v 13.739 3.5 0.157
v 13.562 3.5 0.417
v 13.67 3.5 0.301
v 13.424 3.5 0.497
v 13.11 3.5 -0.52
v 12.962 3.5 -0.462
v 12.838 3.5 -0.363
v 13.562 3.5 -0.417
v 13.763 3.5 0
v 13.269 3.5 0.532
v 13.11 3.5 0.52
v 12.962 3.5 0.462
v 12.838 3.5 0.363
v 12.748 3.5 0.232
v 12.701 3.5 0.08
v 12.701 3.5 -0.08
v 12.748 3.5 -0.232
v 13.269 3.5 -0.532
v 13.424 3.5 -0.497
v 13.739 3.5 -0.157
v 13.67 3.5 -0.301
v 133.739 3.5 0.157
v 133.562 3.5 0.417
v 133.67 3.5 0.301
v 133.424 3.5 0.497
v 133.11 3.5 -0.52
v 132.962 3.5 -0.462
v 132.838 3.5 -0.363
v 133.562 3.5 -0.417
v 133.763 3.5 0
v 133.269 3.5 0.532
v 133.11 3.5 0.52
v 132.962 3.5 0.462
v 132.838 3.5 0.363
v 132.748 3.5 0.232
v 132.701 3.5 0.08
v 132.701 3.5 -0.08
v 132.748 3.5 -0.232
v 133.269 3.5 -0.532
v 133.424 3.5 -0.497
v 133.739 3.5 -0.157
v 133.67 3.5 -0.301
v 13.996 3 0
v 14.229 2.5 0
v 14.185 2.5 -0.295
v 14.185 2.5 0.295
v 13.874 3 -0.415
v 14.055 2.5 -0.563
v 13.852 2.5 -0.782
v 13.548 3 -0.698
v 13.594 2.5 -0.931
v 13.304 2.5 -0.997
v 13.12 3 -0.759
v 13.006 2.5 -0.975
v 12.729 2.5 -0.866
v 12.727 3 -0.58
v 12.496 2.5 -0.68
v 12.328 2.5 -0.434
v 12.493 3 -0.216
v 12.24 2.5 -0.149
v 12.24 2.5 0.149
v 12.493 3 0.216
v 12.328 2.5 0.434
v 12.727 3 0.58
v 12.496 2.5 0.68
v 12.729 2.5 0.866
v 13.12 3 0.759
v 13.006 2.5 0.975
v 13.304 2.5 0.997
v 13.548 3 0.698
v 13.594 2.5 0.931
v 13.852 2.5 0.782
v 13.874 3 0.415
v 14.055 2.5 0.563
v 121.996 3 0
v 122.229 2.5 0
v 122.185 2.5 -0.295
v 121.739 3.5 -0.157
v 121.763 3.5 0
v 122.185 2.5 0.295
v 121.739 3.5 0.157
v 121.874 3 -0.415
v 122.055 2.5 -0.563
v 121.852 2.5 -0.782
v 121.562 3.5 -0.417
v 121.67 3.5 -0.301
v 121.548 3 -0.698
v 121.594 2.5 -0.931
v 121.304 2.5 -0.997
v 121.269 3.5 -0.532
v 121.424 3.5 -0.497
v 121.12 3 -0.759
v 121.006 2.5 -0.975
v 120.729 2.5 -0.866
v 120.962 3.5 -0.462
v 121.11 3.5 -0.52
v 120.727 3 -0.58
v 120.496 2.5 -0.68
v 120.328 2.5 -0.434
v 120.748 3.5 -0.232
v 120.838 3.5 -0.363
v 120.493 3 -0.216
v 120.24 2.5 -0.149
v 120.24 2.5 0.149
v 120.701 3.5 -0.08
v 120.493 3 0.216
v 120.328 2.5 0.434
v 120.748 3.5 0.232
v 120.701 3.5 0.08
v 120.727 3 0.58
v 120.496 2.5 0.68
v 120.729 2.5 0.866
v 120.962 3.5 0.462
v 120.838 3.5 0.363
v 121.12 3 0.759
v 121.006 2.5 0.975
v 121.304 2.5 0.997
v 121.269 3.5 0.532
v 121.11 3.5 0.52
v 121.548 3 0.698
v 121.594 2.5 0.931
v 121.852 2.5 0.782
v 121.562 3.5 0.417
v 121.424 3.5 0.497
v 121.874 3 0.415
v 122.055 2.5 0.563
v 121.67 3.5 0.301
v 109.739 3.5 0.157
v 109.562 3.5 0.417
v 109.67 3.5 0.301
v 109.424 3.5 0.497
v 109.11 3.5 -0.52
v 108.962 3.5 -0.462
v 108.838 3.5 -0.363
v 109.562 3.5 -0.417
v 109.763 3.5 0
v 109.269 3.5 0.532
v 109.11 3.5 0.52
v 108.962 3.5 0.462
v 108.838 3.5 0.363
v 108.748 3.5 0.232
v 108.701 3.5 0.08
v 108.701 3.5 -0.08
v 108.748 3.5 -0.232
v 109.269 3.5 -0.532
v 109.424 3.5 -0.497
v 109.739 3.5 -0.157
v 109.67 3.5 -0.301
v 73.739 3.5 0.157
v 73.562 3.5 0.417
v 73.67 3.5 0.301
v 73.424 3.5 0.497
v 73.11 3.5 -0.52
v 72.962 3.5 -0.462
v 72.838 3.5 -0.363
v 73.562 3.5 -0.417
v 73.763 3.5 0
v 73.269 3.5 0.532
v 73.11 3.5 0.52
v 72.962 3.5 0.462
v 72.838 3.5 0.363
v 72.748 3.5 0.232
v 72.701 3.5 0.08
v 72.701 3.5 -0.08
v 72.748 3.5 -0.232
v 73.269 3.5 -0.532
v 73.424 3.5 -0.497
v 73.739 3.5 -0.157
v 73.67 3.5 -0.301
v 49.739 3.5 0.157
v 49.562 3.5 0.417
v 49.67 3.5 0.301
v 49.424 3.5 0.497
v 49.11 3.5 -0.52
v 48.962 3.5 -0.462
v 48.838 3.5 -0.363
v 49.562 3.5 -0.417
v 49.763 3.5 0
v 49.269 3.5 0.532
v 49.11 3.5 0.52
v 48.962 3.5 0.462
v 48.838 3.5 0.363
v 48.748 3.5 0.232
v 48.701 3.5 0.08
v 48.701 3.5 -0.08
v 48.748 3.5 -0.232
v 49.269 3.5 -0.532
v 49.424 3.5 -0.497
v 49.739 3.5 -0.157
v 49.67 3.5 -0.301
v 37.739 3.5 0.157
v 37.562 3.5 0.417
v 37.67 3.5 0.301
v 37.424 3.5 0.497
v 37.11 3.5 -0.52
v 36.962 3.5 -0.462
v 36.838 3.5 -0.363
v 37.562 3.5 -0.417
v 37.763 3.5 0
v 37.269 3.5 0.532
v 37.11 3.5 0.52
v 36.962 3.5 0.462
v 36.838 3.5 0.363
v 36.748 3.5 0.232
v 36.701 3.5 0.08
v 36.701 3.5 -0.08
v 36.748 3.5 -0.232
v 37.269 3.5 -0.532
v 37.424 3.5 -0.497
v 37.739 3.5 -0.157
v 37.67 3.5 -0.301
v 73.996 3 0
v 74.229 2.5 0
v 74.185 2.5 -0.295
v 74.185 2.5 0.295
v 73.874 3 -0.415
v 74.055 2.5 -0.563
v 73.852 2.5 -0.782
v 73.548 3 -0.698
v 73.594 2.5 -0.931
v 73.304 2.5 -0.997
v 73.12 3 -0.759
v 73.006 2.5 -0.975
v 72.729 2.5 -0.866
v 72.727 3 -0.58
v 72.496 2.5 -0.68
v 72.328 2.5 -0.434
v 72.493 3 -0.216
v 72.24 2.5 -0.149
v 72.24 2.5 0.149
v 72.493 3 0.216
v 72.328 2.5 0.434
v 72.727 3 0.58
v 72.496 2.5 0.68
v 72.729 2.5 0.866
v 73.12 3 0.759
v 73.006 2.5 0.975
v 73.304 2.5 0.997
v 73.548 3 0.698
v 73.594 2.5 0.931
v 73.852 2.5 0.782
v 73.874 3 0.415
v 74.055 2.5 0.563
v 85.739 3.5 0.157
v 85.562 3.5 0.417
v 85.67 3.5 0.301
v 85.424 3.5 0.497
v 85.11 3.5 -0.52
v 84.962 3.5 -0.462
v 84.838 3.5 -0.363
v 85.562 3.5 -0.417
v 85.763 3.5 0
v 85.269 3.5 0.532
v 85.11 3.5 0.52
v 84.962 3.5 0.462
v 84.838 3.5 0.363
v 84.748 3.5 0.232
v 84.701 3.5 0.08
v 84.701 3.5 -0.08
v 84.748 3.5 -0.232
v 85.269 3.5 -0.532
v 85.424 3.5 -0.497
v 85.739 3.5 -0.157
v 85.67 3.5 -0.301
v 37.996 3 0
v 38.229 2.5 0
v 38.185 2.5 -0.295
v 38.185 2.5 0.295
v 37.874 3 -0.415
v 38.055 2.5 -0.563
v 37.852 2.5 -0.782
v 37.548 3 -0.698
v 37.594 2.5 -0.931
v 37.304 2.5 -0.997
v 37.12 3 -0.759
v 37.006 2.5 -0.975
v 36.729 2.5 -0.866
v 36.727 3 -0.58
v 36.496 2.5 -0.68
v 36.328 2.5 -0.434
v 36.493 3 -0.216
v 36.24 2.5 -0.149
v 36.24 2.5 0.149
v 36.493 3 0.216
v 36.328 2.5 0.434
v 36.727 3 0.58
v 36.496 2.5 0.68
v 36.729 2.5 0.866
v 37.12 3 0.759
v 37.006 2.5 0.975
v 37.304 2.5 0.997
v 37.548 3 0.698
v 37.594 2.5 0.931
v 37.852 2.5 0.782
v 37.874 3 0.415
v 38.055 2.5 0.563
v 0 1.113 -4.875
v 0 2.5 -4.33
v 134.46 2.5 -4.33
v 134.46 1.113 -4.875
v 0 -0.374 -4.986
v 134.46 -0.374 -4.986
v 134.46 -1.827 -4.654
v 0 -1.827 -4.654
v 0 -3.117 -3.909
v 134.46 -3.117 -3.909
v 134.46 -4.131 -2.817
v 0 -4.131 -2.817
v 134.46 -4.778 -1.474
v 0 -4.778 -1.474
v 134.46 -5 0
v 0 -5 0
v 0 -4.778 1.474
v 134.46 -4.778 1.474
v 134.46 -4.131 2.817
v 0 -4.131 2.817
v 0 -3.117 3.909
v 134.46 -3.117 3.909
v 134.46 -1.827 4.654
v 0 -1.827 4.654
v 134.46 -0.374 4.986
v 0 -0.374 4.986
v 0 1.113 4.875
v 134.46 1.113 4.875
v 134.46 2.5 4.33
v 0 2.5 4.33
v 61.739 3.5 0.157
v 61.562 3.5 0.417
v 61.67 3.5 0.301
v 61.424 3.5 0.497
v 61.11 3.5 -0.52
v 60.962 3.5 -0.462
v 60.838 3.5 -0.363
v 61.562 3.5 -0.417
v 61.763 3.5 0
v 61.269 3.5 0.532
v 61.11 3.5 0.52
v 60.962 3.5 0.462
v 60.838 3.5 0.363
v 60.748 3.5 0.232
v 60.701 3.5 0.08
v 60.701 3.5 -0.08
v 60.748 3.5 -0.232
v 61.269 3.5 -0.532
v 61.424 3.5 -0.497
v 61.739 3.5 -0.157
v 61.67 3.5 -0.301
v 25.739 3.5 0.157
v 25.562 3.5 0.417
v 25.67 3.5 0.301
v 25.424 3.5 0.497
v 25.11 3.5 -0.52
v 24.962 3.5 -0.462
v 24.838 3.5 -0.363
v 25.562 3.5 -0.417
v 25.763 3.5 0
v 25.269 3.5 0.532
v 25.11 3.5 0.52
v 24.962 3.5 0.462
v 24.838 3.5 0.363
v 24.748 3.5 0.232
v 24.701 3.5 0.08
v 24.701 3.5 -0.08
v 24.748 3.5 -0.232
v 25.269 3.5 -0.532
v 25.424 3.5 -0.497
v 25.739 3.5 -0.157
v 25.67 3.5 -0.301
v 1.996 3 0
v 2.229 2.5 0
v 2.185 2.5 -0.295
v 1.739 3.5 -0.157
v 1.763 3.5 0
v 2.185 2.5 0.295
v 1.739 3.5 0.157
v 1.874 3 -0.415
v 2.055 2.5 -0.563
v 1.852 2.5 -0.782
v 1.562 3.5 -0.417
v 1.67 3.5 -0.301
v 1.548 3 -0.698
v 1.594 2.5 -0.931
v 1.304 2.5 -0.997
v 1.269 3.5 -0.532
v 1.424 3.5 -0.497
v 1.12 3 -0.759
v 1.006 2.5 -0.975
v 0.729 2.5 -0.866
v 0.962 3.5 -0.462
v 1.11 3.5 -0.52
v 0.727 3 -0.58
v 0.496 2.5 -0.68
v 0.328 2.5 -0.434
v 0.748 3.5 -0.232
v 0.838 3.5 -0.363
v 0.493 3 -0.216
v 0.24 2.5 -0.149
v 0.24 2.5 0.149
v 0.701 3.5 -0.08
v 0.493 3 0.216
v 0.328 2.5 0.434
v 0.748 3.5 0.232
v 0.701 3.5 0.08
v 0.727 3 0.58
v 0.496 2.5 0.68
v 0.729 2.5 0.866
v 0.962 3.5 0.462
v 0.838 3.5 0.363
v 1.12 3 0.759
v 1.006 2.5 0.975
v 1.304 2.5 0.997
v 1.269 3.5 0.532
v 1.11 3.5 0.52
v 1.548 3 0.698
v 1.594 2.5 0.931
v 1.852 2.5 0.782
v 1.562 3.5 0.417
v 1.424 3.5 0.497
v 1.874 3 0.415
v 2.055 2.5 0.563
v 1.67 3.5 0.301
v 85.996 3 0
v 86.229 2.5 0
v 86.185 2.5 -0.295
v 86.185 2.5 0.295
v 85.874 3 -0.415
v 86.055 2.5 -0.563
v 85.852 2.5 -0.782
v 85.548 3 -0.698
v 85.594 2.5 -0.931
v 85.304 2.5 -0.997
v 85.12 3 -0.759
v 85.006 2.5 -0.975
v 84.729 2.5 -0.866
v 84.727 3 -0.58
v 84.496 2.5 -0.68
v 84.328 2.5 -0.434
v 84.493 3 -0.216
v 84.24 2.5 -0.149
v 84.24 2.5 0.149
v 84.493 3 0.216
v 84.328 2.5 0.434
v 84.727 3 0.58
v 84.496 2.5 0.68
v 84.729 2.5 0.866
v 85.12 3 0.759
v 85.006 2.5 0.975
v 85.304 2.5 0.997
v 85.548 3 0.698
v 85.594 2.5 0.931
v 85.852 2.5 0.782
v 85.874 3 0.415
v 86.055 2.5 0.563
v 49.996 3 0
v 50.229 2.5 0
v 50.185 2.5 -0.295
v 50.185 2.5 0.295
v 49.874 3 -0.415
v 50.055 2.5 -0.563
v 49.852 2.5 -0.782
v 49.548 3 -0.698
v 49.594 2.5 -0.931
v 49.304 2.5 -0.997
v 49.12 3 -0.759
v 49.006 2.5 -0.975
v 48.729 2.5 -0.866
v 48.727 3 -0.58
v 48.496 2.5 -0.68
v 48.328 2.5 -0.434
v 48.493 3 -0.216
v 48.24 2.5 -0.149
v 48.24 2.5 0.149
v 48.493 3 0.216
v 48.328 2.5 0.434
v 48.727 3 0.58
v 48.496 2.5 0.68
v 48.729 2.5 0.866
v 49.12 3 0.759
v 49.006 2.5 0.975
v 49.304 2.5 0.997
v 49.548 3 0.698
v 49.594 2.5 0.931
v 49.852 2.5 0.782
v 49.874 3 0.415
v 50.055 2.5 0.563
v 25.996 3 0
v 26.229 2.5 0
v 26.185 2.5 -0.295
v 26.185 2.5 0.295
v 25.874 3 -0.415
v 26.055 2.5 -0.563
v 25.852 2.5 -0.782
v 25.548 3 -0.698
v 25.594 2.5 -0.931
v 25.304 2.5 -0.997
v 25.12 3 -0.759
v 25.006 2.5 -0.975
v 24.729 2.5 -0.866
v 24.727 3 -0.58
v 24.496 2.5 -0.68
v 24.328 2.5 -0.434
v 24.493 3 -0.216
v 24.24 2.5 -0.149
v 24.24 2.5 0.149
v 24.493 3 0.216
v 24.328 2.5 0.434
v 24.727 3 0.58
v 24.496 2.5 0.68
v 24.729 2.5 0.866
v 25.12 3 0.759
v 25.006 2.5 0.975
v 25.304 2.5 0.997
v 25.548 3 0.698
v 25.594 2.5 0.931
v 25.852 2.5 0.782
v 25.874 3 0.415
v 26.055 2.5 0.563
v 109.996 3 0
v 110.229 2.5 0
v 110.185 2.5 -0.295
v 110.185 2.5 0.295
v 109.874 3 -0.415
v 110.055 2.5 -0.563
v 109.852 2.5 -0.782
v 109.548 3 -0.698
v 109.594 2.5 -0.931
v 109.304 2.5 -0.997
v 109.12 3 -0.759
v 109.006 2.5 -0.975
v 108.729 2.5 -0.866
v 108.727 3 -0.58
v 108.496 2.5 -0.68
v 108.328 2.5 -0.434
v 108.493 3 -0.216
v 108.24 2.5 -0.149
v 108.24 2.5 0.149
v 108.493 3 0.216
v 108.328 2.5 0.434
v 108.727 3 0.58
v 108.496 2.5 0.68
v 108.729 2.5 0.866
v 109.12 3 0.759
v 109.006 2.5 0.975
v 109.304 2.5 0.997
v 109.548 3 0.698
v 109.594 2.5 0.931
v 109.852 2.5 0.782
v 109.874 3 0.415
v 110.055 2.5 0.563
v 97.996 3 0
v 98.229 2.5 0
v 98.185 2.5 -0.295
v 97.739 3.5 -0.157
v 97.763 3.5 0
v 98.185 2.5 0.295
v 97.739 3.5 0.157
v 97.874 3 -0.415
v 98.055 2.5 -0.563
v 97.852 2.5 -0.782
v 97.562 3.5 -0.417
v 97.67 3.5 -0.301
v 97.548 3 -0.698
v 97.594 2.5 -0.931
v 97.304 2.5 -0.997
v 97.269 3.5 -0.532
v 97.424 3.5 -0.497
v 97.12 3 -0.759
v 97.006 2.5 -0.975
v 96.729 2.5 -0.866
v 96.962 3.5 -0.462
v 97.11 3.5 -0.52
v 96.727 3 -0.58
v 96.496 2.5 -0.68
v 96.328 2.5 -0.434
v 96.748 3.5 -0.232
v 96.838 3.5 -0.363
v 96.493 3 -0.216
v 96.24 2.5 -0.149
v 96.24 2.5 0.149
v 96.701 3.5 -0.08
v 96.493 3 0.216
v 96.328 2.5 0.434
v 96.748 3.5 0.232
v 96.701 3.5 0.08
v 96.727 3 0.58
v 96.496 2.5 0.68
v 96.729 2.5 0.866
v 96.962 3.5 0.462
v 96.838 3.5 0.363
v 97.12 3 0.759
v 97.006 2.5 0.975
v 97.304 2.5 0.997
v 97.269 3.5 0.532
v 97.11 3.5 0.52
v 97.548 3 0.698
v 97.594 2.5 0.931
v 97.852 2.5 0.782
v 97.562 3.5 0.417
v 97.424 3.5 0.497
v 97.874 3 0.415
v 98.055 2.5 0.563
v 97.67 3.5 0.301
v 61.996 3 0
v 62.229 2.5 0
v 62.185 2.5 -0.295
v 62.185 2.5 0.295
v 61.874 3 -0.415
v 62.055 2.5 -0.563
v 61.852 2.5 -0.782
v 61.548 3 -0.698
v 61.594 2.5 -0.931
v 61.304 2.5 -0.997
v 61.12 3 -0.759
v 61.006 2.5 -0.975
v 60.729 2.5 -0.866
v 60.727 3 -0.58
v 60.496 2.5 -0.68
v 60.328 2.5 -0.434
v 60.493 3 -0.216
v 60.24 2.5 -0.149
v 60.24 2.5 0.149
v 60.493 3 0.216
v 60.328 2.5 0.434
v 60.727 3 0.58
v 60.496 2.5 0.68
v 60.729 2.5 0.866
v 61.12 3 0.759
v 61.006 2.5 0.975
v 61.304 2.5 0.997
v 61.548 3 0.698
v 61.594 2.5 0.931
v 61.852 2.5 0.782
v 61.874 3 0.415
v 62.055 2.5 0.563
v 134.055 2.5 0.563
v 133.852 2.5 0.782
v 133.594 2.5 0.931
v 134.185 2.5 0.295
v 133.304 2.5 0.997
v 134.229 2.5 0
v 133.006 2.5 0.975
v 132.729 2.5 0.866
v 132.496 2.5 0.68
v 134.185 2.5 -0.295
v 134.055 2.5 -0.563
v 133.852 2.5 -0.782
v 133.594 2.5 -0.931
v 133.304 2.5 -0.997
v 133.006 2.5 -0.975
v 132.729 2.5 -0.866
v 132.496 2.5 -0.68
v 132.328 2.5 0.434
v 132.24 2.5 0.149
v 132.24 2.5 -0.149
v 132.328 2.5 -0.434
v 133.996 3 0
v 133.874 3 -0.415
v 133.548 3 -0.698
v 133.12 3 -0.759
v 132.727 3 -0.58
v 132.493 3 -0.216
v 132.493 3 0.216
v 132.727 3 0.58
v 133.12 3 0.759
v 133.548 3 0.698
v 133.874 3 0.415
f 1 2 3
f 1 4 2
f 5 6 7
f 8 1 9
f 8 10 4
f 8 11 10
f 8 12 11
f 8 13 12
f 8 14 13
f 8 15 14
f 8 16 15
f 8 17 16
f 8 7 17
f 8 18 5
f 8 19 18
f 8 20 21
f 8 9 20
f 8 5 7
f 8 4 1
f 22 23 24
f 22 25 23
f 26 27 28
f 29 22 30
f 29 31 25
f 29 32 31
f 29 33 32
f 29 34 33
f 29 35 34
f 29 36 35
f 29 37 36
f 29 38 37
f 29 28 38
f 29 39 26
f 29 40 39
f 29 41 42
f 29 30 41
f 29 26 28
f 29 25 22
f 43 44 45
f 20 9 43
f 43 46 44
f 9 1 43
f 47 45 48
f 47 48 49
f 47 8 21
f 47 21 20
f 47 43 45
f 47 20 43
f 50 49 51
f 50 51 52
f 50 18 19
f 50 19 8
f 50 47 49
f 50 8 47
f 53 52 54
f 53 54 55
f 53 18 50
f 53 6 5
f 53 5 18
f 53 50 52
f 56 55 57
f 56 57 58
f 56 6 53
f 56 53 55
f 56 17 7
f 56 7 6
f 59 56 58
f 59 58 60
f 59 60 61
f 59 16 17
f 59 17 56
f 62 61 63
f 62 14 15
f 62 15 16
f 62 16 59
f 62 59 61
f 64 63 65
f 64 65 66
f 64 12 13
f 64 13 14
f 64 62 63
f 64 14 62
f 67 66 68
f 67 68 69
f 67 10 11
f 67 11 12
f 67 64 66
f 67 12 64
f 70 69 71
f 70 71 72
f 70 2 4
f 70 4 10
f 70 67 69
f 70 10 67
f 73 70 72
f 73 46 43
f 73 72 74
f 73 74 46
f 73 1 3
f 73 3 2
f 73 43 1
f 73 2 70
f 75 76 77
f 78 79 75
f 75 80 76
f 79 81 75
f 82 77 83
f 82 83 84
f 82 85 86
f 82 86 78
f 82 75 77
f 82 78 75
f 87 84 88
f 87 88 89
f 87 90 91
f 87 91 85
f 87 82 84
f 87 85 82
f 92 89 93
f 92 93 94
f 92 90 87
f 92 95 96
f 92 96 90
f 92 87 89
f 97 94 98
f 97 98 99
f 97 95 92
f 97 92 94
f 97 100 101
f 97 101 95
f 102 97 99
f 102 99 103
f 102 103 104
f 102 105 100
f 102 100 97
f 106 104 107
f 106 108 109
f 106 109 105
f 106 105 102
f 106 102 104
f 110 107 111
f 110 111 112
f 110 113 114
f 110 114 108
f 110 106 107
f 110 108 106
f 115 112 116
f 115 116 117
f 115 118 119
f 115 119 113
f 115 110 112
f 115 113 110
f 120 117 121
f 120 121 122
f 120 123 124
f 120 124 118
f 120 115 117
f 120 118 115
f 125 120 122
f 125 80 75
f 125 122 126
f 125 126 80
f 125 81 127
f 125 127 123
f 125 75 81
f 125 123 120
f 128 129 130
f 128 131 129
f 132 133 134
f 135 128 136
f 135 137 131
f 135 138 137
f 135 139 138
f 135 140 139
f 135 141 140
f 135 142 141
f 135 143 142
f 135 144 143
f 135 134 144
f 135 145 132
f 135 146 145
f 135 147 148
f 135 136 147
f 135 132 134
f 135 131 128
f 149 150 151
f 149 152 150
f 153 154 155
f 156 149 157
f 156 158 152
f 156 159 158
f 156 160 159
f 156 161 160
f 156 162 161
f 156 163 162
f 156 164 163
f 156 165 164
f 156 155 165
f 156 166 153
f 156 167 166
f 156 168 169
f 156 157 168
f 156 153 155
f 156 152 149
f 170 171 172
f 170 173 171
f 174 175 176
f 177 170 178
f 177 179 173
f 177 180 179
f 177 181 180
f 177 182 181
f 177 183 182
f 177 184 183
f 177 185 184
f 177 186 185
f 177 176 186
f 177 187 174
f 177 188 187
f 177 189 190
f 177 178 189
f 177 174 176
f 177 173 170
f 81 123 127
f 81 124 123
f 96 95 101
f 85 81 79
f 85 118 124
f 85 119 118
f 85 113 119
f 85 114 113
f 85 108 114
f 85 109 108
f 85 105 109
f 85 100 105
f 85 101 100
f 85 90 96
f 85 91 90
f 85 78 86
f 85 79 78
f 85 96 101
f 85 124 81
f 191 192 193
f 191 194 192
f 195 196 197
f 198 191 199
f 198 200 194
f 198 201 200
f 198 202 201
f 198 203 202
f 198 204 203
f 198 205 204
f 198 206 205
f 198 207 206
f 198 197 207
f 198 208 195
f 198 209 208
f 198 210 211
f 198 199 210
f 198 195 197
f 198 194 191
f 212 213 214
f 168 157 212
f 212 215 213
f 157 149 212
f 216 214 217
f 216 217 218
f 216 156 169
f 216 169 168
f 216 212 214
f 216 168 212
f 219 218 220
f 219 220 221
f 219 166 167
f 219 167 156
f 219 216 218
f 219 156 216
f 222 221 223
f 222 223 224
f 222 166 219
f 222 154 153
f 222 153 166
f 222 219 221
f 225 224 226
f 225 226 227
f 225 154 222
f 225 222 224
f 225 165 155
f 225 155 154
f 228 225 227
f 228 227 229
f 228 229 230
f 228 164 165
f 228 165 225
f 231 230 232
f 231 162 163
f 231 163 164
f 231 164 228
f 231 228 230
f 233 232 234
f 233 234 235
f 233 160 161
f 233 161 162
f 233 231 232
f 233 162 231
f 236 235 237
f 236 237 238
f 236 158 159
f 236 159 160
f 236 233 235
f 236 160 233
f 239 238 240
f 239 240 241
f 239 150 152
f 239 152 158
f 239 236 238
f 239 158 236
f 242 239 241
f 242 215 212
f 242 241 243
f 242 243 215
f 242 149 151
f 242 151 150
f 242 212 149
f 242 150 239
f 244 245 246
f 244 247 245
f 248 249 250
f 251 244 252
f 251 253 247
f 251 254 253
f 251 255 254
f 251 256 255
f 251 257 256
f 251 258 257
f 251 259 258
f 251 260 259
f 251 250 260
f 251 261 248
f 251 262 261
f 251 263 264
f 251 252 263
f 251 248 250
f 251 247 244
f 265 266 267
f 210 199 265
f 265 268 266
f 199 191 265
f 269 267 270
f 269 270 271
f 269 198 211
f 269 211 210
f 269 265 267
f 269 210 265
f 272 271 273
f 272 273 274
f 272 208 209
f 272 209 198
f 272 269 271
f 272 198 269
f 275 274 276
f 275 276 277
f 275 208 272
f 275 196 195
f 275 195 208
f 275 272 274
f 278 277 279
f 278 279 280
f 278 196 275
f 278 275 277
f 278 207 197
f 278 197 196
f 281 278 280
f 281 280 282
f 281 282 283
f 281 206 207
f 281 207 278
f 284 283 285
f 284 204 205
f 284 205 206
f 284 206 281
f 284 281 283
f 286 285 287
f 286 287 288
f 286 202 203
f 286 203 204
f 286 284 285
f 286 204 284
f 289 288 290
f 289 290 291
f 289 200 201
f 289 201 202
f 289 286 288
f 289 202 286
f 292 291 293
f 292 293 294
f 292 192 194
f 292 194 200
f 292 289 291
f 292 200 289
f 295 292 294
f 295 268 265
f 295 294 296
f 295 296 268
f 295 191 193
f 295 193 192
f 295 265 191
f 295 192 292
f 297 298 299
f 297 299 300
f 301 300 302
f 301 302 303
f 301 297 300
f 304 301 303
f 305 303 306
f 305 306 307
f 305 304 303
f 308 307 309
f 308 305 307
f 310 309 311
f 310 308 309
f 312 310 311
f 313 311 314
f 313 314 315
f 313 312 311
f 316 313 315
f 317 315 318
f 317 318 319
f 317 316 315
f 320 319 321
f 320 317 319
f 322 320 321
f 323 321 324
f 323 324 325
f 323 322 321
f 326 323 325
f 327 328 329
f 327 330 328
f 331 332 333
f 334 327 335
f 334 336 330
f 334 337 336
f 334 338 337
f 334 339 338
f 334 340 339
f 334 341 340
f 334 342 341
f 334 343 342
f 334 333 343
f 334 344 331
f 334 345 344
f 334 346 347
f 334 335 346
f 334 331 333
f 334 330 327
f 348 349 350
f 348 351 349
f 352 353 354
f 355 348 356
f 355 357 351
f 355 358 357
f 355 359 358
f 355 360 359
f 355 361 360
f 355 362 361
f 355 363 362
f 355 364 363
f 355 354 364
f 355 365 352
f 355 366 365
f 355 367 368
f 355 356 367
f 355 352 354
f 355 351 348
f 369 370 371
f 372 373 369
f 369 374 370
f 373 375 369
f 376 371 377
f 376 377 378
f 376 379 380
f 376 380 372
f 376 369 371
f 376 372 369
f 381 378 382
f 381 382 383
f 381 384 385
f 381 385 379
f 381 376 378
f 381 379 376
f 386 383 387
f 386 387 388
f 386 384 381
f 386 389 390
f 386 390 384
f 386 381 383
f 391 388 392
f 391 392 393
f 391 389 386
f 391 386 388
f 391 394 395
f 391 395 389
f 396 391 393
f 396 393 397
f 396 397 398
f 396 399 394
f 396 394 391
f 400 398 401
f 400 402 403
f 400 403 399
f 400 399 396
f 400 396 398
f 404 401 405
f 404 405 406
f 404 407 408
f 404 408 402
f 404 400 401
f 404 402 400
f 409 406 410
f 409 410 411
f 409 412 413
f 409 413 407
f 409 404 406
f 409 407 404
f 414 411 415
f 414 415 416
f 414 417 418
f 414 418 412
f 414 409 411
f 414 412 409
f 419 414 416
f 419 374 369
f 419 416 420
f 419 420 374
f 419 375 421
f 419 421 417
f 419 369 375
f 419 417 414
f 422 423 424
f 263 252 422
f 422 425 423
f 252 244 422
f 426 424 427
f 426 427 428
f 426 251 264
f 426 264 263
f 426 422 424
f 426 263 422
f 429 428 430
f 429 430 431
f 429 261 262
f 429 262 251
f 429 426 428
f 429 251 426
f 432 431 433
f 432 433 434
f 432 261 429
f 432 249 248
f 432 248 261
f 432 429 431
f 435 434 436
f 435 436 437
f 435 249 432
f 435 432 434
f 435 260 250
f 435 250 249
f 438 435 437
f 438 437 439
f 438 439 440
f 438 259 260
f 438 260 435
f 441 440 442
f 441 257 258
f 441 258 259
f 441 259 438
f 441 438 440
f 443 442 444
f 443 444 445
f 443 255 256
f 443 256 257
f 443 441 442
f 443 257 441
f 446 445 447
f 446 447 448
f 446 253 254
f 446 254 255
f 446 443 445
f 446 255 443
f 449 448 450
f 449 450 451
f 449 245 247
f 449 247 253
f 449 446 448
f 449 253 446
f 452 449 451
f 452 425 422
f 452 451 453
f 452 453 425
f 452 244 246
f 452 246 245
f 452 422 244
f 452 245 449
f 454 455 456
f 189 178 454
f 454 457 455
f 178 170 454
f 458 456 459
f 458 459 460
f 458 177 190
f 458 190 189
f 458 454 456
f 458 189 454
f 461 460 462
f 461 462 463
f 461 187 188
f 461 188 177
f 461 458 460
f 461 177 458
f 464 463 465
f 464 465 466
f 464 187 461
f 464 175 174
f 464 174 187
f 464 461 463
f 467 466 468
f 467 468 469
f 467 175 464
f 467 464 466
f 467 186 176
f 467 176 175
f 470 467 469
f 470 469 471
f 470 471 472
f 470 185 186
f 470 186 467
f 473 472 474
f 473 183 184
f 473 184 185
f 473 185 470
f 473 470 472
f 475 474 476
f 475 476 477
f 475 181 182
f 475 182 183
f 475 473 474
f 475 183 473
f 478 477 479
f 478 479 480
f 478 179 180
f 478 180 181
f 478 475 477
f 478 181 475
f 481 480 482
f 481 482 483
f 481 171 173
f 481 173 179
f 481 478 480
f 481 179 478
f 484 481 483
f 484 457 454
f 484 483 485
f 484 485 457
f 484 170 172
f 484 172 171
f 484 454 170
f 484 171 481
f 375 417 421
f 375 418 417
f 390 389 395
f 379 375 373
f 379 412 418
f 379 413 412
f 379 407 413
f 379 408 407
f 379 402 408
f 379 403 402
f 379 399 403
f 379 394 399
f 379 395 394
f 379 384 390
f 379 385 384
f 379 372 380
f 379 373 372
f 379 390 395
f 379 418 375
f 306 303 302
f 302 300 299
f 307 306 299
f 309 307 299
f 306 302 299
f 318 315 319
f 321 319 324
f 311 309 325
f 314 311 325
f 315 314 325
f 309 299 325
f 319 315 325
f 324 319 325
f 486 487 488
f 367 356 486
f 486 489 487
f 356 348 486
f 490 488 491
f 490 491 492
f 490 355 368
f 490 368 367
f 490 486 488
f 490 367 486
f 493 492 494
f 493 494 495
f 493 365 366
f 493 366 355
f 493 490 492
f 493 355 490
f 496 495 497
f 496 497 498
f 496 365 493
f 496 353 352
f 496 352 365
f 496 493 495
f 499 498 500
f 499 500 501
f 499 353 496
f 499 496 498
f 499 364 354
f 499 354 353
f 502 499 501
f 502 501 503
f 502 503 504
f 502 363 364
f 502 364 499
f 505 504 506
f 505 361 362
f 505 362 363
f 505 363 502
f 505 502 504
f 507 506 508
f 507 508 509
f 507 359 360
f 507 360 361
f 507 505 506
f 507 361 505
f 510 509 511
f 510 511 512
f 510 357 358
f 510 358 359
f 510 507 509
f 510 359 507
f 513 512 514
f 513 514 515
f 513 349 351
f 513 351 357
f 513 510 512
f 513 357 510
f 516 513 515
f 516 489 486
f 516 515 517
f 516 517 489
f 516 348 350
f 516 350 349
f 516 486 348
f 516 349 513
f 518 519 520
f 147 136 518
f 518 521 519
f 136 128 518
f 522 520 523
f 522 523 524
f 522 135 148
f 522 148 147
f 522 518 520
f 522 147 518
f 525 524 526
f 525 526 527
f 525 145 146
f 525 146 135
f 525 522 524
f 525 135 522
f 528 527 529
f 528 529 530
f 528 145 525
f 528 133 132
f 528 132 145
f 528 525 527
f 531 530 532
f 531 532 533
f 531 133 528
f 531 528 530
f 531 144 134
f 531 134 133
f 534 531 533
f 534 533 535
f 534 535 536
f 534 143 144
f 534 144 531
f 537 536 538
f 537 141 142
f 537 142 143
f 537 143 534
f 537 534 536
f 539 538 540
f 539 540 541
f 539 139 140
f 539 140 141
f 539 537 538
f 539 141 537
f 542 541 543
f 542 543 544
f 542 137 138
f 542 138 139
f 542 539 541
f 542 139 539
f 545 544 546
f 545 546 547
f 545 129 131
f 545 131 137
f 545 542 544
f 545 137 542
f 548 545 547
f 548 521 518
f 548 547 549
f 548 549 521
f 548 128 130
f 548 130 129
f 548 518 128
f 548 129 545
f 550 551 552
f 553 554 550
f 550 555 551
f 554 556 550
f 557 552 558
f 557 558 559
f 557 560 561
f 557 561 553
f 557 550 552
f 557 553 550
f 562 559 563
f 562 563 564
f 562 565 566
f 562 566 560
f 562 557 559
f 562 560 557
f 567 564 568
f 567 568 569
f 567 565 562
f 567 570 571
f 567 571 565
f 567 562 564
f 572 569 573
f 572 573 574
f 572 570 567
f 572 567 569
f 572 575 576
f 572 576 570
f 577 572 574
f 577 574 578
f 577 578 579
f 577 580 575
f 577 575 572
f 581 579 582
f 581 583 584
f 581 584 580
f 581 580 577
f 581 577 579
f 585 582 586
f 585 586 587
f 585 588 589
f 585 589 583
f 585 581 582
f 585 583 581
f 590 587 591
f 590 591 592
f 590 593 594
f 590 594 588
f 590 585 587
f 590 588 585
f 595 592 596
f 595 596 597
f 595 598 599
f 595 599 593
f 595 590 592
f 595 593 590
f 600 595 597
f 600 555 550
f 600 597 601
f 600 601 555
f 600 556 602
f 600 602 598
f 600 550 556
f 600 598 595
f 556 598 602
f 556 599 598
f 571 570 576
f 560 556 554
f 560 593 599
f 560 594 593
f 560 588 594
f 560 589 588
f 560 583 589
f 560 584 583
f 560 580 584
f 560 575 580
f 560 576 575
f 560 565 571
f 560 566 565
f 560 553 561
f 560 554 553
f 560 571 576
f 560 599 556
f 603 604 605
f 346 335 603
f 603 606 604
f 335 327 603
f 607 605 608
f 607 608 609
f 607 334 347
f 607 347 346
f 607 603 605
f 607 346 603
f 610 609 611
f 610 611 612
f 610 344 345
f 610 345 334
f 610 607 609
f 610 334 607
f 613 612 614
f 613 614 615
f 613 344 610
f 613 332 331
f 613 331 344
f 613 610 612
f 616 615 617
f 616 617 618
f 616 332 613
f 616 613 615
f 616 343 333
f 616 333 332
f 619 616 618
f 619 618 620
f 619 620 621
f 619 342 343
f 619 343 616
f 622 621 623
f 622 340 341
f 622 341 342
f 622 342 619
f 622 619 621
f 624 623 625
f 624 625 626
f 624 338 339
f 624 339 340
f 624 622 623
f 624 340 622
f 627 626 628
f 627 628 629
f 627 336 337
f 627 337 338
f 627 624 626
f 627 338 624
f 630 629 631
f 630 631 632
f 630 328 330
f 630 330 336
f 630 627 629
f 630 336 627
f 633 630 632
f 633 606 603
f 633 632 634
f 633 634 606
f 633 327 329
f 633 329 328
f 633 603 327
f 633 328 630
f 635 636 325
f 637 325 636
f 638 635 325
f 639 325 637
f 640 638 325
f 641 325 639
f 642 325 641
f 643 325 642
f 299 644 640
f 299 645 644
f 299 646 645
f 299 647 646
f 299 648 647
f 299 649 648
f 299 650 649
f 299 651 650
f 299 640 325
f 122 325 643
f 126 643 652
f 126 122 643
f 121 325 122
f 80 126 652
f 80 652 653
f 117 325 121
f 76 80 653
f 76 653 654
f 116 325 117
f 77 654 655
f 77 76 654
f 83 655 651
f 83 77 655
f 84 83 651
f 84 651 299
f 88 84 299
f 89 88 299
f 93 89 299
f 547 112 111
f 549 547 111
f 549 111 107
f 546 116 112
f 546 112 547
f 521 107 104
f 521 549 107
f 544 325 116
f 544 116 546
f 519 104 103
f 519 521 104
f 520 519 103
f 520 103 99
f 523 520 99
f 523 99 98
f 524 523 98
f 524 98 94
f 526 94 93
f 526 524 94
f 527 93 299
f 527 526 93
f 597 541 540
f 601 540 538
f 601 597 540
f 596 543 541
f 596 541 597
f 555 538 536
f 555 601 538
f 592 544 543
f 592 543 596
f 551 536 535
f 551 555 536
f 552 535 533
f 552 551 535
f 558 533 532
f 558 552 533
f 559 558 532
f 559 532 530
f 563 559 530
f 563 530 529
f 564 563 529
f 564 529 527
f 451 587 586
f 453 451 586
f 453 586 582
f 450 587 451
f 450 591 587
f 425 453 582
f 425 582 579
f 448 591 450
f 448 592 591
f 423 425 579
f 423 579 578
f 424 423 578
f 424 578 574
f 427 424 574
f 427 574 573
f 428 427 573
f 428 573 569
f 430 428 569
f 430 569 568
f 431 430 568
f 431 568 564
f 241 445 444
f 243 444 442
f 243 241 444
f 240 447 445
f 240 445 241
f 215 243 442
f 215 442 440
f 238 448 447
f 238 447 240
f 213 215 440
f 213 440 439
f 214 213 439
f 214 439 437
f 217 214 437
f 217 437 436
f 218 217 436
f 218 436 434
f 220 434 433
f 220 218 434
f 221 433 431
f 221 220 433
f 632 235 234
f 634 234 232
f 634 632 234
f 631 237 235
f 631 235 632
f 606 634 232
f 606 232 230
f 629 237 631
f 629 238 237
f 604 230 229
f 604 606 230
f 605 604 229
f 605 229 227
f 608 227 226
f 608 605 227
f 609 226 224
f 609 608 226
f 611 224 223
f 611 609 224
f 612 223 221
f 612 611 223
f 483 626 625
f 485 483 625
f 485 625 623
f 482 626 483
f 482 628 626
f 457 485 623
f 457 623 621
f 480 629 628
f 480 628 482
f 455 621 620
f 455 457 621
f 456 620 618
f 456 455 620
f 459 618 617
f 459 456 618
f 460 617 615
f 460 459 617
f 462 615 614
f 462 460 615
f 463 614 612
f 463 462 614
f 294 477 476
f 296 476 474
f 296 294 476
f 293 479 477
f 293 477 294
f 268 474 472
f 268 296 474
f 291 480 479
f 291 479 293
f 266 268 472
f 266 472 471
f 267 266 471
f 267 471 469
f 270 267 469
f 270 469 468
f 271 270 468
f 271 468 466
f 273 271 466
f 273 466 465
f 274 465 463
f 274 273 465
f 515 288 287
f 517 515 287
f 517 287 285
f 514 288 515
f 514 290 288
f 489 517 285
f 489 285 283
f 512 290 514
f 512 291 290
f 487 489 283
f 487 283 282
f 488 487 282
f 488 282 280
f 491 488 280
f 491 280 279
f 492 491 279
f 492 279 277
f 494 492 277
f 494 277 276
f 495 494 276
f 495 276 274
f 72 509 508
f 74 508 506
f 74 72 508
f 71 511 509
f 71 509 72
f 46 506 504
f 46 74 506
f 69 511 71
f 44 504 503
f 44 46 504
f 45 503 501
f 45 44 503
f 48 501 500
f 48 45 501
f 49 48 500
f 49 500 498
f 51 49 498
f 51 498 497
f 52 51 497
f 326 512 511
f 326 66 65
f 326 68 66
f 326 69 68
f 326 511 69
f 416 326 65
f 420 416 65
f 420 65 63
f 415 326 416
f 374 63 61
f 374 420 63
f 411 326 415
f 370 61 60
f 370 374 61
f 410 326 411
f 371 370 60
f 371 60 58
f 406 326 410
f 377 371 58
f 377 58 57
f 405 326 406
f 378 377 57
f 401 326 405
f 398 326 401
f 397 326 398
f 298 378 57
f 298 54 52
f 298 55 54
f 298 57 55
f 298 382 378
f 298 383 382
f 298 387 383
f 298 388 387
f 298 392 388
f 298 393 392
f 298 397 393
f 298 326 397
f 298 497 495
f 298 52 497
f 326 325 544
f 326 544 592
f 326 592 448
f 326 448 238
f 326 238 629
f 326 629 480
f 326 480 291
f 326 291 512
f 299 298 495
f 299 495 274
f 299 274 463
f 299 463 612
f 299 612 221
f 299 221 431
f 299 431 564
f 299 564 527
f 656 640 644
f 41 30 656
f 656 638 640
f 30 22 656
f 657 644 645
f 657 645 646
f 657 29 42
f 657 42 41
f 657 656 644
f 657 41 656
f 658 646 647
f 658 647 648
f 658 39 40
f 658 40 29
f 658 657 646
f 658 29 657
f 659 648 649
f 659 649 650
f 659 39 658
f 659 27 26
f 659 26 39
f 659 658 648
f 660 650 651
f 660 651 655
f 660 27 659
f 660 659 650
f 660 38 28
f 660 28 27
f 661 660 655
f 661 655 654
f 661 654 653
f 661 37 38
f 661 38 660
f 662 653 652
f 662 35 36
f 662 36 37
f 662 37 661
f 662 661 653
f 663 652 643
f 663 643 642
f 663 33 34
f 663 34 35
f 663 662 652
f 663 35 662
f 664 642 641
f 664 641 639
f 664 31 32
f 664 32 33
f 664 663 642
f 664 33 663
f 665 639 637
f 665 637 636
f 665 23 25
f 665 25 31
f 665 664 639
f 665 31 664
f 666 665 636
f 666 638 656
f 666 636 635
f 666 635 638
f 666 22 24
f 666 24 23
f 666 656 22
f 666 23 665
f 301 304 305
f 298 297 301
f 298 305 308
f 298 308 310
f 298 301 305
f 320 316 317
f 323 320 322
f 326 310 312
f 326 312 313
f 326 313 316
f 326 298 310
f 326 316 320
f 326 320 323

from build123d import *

# Parameters (mm, degrees)
AUFSATZ_LINEAR_AUSTRAGEN1_DEPTH = 134.46
SKIZZE3_R                       = 1
AUFSATZ_LINEAR_AUSTRAGEN2_DEPTH = 1
AUFSATZ_LINEAR_AUSTRAGEN2_TAPER = 25
LINEARES_MUSTER2_COUNT          = 12
LINEARES_MUSTER2_PITCH          = 12


with BuildPart() as part:
    # Skizze1 → Aufsatz-Linear austragen1 (new body)
    with BuildSketch(Plane(origin=(0, 0, 0), x_dir=(0, 0, -1), z_dir=(1, 0, 0))):
        with BuildLine():
            Line((-4.330127019, 2.5), (4.330127019, 2.5))
            ThreePointArc((4.330127019, 2.5), (0, -5), (-4.330127019, 2.5))
        make_face()
    extrude(amount=AUFSATZ_LINEAR_AUSTRAGEN1_DEPTH)

    # Skizze3 → Aufsatz-Linear austragen2 (add)
    with BuildSketch(Plane(origin=(0, 2.5, 0), x_dir=(1, 0, 0), z_dir=(0, 1, 0))):
        with Locations((1.229, 0)):
            Circle(SKIZZE3_R)
    aufsatz_linear_austragen2 = extrude(amount=AUFSATZ_LINEAR_AUSTRAGEN2_DEPTH, taper=AUFSATZ_LINEAR_AUSTRAGEN2_TAPER)

    # Lineares Muster2: Aufsatz-Linear austragen2 ×12
    with Locations(*[(i * LINEARES_MUSTER2_PITCH, 0, 0) for i in range(1, LINEARES_MUSTER2_COUNT)]):
        add(aufsatz_linear_austragen2)


solid = part.part
